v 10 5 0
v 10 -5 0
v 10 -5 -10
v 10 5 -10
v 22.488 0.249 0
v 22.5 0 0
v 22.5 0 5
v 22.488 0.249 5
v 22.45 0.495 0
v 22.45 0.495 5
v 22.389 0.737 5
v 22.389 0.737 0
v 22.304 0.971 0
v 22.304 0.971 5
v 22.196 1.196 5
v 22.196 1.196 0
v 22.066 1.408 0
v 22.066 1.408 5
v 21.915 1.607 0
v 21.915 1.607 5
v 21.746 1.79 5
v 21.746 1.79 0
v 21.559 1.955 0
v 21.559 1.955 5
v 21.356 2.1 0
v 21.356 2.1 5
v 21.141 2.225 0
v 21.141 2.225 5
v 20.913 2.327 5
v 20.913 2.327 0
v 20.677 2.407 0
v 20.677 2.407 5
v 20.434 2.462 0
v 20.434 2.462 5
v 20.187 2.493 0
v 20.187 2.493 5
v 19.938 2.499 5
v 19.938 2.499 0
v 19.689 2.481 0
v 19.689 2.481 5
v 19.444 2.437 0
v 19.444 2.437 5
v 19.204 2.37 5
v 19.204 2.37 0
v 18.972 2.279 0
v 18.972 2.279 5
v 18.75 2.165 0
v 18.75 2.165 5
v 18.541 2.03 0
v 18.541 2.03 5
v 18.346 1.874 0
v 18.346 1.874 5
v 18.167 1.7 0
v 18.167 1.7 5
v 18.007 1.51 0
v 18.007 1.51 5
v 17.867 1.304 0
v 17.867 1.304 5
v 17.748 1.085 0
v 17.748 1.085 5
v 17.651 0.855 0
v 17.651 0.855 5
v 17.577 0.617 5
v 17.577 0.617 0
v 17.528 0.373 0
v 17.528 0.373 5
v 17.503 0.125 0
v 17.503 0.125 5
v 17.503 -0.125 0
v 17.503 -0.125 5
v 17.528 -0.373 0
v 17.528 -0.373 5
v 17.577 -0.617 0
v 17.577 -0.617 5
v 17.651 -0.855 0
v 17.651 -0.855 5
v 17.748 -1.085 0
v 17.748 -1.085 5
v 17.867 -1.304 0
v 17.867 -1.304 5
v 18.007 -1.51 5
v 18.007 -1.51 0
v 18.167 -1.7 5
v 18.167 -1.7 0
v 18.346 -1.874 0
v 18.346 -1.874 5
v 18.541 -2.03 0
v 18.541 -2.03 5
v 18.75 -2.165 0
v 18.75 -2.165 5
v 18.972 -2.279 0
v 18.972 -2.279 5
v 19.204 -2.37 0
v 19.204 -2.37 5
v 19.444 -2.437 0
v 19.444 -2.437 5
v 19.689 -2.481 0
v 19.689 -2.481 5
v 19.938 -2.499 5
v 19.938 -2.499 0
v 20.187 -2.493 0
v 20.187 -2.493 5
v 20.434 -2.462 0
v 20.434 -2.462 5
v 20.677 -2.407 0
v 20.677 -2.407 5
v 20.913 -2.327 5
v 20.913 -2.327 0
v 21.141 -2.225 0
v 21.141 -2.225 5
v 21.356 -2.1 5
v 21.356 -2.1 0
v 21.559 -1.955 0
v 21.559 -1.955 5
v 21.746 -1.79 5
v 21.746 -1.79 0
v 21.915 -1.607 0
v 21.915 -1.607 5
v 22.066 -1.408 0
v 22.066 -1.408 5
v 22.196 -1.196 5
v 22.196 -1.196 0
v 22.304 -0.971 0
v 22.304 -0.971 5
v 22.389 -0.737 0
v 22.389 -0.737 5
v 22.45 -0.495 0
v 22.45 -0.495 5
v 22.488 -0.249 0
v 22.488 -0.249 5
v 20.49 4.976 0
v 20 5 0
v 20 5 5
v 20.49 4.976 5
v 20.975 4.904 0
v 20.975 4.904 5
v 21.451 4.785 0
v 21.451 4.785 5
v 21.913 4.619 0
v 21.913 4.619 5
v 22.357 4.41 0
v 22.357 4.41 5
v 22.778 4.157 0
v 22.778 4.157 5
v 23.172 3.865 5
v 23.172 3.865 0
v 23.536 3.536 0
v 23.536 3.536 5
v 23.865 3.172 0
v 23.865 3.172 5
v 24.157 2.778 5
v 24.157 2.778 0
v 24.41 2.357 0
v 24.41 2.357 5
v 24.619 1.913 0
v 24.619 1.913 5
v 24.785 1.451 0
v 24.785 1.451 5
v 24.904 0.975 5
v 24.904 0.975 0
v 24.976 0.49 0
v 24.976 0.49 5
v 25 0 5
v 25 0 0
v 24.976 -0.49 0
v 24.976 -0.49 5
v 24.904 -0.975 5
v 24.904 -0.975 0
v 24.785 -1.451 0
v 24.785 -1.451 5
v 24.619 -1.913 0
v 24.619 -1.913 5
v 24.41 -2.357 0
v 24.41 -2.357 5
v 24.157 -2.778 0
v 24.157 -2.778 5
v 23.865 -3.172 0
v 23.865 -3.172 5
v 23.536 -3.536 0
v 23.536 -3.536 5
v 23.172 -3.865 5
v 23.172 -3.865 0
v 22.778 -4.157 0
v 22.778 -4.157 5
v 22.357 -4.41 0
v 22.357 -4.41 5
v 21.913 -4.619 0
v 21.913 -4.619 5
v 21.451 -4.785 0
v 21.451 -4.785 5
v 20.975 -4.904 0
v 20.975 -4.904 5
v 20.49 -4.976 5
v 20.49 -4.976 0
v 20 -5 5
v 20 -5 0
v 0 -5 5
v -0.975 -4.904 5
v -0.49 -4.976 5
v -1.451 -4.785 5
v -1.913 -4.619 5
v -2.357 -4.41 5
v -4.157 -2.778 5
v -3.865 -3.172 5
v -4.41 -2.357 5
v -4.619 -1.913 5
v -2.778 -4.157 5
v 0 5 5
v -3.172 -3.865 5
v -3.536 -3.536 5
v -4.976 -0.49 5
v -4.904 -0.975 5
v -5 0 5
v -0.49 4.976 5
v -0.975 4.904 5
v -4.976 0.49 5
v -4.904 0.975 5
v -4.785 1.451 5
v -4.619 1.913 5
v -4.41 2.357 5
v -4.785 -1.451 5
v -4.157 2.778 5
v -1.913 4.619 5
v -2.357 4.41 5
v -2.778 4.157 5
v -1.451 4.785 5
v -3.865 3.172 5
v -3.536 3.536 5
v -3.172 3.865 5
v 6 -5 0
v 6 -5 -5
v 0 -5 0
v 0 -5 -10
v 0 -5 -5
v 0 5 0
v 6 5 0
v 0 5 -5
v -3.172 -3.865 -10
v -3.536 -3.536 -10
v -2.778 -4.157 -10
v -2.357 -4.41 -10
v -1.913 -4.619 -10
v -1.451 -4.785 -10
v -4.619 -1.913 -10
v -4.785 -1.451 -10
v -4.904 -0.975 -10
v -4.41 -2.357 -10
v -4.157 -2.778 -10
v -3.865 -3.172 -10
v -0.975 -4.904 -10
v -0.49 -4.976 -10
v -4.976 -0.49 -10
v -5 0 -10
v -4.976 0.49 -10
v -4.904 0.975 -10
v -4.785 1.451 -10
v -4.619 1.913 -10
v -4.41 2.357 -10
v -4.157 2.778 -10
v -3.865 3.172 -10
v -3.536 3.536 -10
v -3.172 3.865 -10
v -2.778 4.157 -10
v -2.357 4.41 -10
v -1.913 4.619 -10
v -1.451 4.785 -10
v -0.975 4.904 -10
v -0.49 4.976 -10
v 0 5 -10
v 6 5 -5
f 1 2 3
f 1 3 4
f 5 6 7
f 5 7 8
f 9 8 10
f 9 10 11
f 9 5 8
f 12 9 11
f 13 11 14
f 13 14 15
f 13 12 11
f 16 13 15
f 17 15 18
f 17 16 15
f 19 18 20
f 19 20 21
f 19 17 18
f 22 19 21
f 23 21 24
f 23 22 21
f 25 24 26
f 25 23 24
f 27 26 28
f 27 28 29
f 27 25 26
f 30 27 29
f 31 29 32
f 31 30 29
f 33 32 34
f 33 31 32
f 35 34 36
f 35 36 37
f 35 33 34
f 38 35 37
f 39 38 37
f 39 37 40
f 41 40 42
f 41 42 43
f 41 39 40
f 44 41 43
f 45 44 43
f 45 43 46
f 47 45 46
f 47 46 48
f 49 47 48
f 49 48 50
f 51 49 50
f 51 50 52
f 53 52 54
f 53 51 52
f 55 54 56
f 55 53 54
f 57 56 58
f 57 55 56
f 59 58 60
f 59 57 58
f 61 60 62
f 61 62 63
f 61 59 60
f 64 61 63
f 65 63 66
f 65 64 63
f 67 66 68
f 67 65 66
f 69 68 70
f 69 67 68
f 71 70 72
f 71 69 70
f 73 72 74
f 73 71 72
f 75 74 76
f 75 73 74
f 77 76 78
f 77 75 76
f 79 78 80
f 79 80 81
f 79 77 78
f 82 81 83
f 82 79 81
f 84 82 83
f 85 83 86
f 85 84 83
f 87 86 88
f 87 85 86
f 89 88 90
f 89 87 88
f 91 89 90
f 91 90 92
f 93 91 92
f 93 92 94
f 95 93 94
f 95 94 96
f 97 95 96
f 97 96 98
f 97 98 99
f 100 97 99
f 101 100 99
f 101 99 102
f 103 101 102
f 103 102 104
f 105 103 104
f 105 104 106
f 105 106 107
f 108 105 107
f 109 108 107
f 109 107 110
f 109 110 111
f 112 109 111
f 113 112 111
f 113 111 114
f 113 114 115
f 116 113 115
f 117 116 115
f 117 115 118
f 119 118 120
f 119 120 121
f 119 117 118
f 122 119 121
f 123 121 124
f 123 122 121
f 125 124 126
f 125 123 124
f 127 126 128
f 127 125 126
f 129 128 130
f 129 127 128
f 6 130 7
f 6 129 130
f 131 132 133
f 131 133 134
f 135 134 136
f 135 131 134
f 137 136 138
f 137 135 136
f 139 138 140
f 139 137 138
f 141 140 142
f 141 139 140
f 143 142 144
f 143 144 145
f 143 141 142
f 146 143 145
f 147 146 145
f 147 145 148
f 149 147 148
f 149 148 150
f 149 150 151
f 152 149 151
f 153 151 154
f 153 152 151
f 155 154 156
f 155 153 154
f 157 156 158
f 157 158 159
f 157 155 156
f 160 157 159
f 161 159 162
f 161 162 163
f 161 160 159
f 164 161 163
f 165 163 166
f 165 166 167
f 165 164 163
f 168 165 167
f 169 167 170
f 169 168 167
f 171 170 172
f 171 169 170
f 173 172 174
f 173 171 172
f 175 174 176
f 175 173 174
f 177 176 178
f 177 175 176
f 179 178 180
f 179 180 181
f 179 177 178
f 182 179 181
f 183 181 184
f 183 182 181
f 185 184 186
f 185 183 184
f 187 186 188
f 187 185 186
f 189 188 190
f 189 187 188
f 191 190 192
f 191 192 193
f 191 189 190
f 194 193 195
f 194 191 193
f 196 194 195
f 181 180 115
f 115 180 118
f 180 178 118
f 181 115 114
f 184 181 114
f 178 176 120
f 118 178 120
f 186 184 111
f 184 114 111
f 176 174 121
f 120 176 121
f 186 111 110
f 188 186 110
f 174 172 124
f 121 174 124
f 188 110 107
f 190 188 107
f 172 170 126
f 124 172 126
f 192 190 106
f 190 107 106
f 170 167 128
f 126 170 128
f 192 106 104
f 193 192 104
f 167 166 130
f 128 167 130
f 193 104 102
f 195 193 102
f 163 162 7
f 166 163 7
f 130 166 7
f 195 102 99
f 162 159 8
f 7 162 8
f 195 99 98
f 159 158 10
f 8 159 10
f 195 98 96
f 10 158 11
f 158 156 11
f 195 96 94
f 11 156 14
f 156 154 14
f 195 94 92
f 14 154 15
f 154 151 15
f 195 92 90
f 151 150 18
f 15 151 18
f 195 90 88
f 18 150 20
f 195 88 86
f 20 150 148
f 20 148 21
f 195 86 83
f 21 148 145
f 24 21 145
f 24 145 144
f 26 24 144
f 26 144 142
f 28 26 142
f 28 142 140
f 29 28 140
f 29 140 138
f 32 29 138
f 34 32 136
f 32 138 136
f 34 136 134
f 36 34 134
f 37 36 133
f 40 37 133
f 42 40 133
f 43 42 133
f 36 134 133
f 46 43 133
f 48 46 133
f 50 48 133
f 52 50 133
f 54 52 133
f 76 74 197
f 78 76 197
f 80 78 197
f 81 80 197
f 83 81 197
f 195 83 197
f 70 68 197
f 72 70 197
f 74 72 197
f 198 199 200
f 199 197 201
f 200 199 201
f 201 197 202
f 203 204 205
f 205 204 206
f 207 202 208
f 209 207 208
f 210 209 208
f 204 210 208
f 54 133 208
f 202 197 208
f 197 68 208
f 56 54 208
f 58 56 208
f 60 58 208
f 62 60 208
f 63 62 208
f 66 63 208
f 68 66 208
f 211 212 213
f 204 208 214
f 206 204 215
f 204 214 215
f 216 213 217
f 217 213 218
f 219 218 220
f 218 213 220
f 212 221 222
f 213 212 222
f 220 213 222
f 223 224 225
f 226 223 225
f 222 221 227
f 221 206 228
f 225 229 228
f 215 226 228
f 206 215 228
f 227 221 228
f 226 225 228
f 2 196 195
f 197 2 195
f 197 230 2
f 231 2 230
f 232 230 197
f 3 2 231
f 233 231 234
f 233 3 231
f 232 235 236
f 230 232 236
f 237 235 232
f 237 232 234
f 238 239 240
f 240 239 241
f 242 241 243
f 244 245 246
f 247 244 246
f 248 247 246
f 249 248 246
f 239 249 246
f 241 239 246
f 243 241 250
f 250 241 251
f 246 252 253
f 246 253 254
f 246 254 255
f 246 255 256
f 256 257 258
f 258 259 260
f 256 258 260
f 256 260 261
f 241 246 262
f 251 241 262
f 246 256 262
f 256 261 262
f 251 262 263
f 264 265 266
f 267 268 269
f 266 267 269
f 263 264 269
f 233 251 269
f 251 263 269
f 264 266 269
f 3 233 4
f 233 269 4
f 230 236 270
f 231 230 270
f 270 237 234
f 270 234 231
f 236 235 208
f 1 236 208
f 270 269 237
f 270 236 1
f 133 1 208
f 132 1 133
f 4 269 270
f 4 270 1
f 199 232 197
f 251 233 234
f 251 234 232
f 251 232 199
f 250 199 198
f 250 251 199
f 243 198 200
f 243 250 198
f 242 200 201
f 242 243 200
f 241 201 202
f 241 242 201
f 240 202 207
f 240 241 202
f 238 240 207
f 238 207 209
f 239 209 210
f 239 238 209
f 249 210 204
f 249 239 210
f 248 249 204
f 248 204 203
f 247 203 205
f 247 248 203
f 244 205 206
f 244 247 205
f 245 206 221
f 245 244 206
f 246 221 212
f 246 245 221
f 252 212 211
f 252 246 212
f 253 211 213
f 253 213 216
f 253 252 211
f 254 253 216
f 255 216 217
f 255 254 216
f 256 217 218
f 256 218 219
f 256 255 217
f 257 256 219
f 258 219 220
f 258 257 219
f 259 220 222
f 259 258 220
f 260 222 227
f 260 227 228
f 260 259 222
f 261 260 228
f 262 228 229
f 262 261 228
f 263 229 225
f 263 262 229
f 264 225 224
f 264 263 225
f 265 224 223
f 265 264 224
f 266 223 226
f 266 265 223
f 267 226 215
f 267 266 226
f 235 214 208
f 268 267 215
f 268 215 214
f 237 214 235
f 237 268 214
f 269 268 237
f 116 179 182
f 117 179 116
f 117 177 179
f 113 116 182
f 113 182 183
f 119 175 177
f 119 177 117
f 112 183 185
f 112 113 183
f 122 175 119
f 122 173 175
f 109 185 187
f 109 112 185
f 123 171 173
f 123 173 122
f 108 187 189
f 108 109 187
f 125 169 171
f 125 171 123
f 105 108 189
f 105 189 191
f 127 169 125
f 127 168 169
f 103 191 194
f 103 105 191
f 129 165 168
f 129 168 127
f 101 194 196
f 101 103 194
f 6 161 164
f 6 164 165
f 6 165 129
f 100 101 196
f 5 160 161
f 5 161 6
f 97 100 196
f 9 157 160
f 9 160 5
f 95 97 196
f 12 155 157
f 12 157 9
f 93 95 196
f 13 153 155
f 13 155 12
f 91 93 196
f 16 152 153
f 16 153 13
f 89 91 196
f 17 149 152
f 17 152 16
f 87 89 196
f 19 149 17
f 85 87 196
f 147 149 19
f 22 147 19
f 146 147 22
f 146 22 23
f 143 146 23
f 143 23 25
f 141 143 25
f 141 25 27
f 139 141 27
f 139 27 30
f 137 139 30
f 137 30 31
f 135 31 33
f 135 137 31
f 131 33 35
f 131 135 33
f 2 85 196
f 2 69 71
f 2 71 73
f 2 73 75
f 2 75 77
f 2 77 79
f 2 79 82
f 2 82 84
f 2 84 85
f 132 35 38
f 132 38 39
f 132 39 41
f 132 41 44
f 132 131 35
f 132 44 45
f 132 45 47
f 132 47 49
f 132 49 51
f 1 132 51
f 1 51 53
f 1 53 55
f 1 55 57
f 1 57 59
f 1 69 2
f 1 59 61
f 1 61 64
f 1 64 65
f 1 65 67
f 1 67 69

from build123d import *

# Parameters (mm, degrees)
SKETCH2_R                = 2.5
BOSS_EXTRUDE1_DEPTH      = 5
BOSS_EXTRUDE2_DEPTH      = 10
BOSS_EXTRUDE2_DEPTH_BACK = 5
SKETCH4_W                = 6
SKETCH4_H                = 5
CUT_EXTRUDE1_DEPTH       = 10


with BuildPart() as part:
    # Sketch2 → Boss-Extrude1 (new body)
    with BuildSketch(Plane.XY):
        with BuildLine():
            Line((0, 5), (20, 5))
            ThreePointArc((20, 5), (25, 0), (20, -5))
            Line((20, -5), (0, -5))
            ThreePointArc((0, -5), (-5, 0), (0, 5))
        make_face()
        with Locations((20, 0)):
            Circle(SKETCH2_R, mode=Mode.SUBTRACT)
    extrude(amount=BOSS_EXTRUDE1_DEPTH)

    # Sketch3 → Boss-Extrude2 (add, two sides: drawn at the far end of the back side and taken through both)
    with BuildSketch(Plane(origin=(0, 0, 0), x_dir=(-1, 0, 0), z_dir=(0, 0, -1)).offset(-BOSS_EXTRUDE2_DEPTH_BACK)):
        with BuildLine():
            Line((-10, 5), (0, 5))
            ThreePointArc((0, 5), (5, 0), (0, -5))
            Line((0, -5), (-10, -5))
            Line((-10, -5), (-10, 5))
        make_face()
    extrude(amount=BOSS_EXTRUDE2_DEPTH + BOSS_EXTRUDE2_DEPTH_BACK)

    # Sketch4 → Cut-Extrude1 (cut)
    with BuildSketch(Plane(origin=(0, 5, 0), x_dir=(1, 0, 0), z_dir=(0, 1, 0))):
        with Locations((3, 2.5)):
            Rectangle(SKETCH4_W, SKETCH4_H)
    extrude(amount=-CUT_EXTRUDE1_DEPTH, mode=Mode.SUBTRACT)


solid = part.part
